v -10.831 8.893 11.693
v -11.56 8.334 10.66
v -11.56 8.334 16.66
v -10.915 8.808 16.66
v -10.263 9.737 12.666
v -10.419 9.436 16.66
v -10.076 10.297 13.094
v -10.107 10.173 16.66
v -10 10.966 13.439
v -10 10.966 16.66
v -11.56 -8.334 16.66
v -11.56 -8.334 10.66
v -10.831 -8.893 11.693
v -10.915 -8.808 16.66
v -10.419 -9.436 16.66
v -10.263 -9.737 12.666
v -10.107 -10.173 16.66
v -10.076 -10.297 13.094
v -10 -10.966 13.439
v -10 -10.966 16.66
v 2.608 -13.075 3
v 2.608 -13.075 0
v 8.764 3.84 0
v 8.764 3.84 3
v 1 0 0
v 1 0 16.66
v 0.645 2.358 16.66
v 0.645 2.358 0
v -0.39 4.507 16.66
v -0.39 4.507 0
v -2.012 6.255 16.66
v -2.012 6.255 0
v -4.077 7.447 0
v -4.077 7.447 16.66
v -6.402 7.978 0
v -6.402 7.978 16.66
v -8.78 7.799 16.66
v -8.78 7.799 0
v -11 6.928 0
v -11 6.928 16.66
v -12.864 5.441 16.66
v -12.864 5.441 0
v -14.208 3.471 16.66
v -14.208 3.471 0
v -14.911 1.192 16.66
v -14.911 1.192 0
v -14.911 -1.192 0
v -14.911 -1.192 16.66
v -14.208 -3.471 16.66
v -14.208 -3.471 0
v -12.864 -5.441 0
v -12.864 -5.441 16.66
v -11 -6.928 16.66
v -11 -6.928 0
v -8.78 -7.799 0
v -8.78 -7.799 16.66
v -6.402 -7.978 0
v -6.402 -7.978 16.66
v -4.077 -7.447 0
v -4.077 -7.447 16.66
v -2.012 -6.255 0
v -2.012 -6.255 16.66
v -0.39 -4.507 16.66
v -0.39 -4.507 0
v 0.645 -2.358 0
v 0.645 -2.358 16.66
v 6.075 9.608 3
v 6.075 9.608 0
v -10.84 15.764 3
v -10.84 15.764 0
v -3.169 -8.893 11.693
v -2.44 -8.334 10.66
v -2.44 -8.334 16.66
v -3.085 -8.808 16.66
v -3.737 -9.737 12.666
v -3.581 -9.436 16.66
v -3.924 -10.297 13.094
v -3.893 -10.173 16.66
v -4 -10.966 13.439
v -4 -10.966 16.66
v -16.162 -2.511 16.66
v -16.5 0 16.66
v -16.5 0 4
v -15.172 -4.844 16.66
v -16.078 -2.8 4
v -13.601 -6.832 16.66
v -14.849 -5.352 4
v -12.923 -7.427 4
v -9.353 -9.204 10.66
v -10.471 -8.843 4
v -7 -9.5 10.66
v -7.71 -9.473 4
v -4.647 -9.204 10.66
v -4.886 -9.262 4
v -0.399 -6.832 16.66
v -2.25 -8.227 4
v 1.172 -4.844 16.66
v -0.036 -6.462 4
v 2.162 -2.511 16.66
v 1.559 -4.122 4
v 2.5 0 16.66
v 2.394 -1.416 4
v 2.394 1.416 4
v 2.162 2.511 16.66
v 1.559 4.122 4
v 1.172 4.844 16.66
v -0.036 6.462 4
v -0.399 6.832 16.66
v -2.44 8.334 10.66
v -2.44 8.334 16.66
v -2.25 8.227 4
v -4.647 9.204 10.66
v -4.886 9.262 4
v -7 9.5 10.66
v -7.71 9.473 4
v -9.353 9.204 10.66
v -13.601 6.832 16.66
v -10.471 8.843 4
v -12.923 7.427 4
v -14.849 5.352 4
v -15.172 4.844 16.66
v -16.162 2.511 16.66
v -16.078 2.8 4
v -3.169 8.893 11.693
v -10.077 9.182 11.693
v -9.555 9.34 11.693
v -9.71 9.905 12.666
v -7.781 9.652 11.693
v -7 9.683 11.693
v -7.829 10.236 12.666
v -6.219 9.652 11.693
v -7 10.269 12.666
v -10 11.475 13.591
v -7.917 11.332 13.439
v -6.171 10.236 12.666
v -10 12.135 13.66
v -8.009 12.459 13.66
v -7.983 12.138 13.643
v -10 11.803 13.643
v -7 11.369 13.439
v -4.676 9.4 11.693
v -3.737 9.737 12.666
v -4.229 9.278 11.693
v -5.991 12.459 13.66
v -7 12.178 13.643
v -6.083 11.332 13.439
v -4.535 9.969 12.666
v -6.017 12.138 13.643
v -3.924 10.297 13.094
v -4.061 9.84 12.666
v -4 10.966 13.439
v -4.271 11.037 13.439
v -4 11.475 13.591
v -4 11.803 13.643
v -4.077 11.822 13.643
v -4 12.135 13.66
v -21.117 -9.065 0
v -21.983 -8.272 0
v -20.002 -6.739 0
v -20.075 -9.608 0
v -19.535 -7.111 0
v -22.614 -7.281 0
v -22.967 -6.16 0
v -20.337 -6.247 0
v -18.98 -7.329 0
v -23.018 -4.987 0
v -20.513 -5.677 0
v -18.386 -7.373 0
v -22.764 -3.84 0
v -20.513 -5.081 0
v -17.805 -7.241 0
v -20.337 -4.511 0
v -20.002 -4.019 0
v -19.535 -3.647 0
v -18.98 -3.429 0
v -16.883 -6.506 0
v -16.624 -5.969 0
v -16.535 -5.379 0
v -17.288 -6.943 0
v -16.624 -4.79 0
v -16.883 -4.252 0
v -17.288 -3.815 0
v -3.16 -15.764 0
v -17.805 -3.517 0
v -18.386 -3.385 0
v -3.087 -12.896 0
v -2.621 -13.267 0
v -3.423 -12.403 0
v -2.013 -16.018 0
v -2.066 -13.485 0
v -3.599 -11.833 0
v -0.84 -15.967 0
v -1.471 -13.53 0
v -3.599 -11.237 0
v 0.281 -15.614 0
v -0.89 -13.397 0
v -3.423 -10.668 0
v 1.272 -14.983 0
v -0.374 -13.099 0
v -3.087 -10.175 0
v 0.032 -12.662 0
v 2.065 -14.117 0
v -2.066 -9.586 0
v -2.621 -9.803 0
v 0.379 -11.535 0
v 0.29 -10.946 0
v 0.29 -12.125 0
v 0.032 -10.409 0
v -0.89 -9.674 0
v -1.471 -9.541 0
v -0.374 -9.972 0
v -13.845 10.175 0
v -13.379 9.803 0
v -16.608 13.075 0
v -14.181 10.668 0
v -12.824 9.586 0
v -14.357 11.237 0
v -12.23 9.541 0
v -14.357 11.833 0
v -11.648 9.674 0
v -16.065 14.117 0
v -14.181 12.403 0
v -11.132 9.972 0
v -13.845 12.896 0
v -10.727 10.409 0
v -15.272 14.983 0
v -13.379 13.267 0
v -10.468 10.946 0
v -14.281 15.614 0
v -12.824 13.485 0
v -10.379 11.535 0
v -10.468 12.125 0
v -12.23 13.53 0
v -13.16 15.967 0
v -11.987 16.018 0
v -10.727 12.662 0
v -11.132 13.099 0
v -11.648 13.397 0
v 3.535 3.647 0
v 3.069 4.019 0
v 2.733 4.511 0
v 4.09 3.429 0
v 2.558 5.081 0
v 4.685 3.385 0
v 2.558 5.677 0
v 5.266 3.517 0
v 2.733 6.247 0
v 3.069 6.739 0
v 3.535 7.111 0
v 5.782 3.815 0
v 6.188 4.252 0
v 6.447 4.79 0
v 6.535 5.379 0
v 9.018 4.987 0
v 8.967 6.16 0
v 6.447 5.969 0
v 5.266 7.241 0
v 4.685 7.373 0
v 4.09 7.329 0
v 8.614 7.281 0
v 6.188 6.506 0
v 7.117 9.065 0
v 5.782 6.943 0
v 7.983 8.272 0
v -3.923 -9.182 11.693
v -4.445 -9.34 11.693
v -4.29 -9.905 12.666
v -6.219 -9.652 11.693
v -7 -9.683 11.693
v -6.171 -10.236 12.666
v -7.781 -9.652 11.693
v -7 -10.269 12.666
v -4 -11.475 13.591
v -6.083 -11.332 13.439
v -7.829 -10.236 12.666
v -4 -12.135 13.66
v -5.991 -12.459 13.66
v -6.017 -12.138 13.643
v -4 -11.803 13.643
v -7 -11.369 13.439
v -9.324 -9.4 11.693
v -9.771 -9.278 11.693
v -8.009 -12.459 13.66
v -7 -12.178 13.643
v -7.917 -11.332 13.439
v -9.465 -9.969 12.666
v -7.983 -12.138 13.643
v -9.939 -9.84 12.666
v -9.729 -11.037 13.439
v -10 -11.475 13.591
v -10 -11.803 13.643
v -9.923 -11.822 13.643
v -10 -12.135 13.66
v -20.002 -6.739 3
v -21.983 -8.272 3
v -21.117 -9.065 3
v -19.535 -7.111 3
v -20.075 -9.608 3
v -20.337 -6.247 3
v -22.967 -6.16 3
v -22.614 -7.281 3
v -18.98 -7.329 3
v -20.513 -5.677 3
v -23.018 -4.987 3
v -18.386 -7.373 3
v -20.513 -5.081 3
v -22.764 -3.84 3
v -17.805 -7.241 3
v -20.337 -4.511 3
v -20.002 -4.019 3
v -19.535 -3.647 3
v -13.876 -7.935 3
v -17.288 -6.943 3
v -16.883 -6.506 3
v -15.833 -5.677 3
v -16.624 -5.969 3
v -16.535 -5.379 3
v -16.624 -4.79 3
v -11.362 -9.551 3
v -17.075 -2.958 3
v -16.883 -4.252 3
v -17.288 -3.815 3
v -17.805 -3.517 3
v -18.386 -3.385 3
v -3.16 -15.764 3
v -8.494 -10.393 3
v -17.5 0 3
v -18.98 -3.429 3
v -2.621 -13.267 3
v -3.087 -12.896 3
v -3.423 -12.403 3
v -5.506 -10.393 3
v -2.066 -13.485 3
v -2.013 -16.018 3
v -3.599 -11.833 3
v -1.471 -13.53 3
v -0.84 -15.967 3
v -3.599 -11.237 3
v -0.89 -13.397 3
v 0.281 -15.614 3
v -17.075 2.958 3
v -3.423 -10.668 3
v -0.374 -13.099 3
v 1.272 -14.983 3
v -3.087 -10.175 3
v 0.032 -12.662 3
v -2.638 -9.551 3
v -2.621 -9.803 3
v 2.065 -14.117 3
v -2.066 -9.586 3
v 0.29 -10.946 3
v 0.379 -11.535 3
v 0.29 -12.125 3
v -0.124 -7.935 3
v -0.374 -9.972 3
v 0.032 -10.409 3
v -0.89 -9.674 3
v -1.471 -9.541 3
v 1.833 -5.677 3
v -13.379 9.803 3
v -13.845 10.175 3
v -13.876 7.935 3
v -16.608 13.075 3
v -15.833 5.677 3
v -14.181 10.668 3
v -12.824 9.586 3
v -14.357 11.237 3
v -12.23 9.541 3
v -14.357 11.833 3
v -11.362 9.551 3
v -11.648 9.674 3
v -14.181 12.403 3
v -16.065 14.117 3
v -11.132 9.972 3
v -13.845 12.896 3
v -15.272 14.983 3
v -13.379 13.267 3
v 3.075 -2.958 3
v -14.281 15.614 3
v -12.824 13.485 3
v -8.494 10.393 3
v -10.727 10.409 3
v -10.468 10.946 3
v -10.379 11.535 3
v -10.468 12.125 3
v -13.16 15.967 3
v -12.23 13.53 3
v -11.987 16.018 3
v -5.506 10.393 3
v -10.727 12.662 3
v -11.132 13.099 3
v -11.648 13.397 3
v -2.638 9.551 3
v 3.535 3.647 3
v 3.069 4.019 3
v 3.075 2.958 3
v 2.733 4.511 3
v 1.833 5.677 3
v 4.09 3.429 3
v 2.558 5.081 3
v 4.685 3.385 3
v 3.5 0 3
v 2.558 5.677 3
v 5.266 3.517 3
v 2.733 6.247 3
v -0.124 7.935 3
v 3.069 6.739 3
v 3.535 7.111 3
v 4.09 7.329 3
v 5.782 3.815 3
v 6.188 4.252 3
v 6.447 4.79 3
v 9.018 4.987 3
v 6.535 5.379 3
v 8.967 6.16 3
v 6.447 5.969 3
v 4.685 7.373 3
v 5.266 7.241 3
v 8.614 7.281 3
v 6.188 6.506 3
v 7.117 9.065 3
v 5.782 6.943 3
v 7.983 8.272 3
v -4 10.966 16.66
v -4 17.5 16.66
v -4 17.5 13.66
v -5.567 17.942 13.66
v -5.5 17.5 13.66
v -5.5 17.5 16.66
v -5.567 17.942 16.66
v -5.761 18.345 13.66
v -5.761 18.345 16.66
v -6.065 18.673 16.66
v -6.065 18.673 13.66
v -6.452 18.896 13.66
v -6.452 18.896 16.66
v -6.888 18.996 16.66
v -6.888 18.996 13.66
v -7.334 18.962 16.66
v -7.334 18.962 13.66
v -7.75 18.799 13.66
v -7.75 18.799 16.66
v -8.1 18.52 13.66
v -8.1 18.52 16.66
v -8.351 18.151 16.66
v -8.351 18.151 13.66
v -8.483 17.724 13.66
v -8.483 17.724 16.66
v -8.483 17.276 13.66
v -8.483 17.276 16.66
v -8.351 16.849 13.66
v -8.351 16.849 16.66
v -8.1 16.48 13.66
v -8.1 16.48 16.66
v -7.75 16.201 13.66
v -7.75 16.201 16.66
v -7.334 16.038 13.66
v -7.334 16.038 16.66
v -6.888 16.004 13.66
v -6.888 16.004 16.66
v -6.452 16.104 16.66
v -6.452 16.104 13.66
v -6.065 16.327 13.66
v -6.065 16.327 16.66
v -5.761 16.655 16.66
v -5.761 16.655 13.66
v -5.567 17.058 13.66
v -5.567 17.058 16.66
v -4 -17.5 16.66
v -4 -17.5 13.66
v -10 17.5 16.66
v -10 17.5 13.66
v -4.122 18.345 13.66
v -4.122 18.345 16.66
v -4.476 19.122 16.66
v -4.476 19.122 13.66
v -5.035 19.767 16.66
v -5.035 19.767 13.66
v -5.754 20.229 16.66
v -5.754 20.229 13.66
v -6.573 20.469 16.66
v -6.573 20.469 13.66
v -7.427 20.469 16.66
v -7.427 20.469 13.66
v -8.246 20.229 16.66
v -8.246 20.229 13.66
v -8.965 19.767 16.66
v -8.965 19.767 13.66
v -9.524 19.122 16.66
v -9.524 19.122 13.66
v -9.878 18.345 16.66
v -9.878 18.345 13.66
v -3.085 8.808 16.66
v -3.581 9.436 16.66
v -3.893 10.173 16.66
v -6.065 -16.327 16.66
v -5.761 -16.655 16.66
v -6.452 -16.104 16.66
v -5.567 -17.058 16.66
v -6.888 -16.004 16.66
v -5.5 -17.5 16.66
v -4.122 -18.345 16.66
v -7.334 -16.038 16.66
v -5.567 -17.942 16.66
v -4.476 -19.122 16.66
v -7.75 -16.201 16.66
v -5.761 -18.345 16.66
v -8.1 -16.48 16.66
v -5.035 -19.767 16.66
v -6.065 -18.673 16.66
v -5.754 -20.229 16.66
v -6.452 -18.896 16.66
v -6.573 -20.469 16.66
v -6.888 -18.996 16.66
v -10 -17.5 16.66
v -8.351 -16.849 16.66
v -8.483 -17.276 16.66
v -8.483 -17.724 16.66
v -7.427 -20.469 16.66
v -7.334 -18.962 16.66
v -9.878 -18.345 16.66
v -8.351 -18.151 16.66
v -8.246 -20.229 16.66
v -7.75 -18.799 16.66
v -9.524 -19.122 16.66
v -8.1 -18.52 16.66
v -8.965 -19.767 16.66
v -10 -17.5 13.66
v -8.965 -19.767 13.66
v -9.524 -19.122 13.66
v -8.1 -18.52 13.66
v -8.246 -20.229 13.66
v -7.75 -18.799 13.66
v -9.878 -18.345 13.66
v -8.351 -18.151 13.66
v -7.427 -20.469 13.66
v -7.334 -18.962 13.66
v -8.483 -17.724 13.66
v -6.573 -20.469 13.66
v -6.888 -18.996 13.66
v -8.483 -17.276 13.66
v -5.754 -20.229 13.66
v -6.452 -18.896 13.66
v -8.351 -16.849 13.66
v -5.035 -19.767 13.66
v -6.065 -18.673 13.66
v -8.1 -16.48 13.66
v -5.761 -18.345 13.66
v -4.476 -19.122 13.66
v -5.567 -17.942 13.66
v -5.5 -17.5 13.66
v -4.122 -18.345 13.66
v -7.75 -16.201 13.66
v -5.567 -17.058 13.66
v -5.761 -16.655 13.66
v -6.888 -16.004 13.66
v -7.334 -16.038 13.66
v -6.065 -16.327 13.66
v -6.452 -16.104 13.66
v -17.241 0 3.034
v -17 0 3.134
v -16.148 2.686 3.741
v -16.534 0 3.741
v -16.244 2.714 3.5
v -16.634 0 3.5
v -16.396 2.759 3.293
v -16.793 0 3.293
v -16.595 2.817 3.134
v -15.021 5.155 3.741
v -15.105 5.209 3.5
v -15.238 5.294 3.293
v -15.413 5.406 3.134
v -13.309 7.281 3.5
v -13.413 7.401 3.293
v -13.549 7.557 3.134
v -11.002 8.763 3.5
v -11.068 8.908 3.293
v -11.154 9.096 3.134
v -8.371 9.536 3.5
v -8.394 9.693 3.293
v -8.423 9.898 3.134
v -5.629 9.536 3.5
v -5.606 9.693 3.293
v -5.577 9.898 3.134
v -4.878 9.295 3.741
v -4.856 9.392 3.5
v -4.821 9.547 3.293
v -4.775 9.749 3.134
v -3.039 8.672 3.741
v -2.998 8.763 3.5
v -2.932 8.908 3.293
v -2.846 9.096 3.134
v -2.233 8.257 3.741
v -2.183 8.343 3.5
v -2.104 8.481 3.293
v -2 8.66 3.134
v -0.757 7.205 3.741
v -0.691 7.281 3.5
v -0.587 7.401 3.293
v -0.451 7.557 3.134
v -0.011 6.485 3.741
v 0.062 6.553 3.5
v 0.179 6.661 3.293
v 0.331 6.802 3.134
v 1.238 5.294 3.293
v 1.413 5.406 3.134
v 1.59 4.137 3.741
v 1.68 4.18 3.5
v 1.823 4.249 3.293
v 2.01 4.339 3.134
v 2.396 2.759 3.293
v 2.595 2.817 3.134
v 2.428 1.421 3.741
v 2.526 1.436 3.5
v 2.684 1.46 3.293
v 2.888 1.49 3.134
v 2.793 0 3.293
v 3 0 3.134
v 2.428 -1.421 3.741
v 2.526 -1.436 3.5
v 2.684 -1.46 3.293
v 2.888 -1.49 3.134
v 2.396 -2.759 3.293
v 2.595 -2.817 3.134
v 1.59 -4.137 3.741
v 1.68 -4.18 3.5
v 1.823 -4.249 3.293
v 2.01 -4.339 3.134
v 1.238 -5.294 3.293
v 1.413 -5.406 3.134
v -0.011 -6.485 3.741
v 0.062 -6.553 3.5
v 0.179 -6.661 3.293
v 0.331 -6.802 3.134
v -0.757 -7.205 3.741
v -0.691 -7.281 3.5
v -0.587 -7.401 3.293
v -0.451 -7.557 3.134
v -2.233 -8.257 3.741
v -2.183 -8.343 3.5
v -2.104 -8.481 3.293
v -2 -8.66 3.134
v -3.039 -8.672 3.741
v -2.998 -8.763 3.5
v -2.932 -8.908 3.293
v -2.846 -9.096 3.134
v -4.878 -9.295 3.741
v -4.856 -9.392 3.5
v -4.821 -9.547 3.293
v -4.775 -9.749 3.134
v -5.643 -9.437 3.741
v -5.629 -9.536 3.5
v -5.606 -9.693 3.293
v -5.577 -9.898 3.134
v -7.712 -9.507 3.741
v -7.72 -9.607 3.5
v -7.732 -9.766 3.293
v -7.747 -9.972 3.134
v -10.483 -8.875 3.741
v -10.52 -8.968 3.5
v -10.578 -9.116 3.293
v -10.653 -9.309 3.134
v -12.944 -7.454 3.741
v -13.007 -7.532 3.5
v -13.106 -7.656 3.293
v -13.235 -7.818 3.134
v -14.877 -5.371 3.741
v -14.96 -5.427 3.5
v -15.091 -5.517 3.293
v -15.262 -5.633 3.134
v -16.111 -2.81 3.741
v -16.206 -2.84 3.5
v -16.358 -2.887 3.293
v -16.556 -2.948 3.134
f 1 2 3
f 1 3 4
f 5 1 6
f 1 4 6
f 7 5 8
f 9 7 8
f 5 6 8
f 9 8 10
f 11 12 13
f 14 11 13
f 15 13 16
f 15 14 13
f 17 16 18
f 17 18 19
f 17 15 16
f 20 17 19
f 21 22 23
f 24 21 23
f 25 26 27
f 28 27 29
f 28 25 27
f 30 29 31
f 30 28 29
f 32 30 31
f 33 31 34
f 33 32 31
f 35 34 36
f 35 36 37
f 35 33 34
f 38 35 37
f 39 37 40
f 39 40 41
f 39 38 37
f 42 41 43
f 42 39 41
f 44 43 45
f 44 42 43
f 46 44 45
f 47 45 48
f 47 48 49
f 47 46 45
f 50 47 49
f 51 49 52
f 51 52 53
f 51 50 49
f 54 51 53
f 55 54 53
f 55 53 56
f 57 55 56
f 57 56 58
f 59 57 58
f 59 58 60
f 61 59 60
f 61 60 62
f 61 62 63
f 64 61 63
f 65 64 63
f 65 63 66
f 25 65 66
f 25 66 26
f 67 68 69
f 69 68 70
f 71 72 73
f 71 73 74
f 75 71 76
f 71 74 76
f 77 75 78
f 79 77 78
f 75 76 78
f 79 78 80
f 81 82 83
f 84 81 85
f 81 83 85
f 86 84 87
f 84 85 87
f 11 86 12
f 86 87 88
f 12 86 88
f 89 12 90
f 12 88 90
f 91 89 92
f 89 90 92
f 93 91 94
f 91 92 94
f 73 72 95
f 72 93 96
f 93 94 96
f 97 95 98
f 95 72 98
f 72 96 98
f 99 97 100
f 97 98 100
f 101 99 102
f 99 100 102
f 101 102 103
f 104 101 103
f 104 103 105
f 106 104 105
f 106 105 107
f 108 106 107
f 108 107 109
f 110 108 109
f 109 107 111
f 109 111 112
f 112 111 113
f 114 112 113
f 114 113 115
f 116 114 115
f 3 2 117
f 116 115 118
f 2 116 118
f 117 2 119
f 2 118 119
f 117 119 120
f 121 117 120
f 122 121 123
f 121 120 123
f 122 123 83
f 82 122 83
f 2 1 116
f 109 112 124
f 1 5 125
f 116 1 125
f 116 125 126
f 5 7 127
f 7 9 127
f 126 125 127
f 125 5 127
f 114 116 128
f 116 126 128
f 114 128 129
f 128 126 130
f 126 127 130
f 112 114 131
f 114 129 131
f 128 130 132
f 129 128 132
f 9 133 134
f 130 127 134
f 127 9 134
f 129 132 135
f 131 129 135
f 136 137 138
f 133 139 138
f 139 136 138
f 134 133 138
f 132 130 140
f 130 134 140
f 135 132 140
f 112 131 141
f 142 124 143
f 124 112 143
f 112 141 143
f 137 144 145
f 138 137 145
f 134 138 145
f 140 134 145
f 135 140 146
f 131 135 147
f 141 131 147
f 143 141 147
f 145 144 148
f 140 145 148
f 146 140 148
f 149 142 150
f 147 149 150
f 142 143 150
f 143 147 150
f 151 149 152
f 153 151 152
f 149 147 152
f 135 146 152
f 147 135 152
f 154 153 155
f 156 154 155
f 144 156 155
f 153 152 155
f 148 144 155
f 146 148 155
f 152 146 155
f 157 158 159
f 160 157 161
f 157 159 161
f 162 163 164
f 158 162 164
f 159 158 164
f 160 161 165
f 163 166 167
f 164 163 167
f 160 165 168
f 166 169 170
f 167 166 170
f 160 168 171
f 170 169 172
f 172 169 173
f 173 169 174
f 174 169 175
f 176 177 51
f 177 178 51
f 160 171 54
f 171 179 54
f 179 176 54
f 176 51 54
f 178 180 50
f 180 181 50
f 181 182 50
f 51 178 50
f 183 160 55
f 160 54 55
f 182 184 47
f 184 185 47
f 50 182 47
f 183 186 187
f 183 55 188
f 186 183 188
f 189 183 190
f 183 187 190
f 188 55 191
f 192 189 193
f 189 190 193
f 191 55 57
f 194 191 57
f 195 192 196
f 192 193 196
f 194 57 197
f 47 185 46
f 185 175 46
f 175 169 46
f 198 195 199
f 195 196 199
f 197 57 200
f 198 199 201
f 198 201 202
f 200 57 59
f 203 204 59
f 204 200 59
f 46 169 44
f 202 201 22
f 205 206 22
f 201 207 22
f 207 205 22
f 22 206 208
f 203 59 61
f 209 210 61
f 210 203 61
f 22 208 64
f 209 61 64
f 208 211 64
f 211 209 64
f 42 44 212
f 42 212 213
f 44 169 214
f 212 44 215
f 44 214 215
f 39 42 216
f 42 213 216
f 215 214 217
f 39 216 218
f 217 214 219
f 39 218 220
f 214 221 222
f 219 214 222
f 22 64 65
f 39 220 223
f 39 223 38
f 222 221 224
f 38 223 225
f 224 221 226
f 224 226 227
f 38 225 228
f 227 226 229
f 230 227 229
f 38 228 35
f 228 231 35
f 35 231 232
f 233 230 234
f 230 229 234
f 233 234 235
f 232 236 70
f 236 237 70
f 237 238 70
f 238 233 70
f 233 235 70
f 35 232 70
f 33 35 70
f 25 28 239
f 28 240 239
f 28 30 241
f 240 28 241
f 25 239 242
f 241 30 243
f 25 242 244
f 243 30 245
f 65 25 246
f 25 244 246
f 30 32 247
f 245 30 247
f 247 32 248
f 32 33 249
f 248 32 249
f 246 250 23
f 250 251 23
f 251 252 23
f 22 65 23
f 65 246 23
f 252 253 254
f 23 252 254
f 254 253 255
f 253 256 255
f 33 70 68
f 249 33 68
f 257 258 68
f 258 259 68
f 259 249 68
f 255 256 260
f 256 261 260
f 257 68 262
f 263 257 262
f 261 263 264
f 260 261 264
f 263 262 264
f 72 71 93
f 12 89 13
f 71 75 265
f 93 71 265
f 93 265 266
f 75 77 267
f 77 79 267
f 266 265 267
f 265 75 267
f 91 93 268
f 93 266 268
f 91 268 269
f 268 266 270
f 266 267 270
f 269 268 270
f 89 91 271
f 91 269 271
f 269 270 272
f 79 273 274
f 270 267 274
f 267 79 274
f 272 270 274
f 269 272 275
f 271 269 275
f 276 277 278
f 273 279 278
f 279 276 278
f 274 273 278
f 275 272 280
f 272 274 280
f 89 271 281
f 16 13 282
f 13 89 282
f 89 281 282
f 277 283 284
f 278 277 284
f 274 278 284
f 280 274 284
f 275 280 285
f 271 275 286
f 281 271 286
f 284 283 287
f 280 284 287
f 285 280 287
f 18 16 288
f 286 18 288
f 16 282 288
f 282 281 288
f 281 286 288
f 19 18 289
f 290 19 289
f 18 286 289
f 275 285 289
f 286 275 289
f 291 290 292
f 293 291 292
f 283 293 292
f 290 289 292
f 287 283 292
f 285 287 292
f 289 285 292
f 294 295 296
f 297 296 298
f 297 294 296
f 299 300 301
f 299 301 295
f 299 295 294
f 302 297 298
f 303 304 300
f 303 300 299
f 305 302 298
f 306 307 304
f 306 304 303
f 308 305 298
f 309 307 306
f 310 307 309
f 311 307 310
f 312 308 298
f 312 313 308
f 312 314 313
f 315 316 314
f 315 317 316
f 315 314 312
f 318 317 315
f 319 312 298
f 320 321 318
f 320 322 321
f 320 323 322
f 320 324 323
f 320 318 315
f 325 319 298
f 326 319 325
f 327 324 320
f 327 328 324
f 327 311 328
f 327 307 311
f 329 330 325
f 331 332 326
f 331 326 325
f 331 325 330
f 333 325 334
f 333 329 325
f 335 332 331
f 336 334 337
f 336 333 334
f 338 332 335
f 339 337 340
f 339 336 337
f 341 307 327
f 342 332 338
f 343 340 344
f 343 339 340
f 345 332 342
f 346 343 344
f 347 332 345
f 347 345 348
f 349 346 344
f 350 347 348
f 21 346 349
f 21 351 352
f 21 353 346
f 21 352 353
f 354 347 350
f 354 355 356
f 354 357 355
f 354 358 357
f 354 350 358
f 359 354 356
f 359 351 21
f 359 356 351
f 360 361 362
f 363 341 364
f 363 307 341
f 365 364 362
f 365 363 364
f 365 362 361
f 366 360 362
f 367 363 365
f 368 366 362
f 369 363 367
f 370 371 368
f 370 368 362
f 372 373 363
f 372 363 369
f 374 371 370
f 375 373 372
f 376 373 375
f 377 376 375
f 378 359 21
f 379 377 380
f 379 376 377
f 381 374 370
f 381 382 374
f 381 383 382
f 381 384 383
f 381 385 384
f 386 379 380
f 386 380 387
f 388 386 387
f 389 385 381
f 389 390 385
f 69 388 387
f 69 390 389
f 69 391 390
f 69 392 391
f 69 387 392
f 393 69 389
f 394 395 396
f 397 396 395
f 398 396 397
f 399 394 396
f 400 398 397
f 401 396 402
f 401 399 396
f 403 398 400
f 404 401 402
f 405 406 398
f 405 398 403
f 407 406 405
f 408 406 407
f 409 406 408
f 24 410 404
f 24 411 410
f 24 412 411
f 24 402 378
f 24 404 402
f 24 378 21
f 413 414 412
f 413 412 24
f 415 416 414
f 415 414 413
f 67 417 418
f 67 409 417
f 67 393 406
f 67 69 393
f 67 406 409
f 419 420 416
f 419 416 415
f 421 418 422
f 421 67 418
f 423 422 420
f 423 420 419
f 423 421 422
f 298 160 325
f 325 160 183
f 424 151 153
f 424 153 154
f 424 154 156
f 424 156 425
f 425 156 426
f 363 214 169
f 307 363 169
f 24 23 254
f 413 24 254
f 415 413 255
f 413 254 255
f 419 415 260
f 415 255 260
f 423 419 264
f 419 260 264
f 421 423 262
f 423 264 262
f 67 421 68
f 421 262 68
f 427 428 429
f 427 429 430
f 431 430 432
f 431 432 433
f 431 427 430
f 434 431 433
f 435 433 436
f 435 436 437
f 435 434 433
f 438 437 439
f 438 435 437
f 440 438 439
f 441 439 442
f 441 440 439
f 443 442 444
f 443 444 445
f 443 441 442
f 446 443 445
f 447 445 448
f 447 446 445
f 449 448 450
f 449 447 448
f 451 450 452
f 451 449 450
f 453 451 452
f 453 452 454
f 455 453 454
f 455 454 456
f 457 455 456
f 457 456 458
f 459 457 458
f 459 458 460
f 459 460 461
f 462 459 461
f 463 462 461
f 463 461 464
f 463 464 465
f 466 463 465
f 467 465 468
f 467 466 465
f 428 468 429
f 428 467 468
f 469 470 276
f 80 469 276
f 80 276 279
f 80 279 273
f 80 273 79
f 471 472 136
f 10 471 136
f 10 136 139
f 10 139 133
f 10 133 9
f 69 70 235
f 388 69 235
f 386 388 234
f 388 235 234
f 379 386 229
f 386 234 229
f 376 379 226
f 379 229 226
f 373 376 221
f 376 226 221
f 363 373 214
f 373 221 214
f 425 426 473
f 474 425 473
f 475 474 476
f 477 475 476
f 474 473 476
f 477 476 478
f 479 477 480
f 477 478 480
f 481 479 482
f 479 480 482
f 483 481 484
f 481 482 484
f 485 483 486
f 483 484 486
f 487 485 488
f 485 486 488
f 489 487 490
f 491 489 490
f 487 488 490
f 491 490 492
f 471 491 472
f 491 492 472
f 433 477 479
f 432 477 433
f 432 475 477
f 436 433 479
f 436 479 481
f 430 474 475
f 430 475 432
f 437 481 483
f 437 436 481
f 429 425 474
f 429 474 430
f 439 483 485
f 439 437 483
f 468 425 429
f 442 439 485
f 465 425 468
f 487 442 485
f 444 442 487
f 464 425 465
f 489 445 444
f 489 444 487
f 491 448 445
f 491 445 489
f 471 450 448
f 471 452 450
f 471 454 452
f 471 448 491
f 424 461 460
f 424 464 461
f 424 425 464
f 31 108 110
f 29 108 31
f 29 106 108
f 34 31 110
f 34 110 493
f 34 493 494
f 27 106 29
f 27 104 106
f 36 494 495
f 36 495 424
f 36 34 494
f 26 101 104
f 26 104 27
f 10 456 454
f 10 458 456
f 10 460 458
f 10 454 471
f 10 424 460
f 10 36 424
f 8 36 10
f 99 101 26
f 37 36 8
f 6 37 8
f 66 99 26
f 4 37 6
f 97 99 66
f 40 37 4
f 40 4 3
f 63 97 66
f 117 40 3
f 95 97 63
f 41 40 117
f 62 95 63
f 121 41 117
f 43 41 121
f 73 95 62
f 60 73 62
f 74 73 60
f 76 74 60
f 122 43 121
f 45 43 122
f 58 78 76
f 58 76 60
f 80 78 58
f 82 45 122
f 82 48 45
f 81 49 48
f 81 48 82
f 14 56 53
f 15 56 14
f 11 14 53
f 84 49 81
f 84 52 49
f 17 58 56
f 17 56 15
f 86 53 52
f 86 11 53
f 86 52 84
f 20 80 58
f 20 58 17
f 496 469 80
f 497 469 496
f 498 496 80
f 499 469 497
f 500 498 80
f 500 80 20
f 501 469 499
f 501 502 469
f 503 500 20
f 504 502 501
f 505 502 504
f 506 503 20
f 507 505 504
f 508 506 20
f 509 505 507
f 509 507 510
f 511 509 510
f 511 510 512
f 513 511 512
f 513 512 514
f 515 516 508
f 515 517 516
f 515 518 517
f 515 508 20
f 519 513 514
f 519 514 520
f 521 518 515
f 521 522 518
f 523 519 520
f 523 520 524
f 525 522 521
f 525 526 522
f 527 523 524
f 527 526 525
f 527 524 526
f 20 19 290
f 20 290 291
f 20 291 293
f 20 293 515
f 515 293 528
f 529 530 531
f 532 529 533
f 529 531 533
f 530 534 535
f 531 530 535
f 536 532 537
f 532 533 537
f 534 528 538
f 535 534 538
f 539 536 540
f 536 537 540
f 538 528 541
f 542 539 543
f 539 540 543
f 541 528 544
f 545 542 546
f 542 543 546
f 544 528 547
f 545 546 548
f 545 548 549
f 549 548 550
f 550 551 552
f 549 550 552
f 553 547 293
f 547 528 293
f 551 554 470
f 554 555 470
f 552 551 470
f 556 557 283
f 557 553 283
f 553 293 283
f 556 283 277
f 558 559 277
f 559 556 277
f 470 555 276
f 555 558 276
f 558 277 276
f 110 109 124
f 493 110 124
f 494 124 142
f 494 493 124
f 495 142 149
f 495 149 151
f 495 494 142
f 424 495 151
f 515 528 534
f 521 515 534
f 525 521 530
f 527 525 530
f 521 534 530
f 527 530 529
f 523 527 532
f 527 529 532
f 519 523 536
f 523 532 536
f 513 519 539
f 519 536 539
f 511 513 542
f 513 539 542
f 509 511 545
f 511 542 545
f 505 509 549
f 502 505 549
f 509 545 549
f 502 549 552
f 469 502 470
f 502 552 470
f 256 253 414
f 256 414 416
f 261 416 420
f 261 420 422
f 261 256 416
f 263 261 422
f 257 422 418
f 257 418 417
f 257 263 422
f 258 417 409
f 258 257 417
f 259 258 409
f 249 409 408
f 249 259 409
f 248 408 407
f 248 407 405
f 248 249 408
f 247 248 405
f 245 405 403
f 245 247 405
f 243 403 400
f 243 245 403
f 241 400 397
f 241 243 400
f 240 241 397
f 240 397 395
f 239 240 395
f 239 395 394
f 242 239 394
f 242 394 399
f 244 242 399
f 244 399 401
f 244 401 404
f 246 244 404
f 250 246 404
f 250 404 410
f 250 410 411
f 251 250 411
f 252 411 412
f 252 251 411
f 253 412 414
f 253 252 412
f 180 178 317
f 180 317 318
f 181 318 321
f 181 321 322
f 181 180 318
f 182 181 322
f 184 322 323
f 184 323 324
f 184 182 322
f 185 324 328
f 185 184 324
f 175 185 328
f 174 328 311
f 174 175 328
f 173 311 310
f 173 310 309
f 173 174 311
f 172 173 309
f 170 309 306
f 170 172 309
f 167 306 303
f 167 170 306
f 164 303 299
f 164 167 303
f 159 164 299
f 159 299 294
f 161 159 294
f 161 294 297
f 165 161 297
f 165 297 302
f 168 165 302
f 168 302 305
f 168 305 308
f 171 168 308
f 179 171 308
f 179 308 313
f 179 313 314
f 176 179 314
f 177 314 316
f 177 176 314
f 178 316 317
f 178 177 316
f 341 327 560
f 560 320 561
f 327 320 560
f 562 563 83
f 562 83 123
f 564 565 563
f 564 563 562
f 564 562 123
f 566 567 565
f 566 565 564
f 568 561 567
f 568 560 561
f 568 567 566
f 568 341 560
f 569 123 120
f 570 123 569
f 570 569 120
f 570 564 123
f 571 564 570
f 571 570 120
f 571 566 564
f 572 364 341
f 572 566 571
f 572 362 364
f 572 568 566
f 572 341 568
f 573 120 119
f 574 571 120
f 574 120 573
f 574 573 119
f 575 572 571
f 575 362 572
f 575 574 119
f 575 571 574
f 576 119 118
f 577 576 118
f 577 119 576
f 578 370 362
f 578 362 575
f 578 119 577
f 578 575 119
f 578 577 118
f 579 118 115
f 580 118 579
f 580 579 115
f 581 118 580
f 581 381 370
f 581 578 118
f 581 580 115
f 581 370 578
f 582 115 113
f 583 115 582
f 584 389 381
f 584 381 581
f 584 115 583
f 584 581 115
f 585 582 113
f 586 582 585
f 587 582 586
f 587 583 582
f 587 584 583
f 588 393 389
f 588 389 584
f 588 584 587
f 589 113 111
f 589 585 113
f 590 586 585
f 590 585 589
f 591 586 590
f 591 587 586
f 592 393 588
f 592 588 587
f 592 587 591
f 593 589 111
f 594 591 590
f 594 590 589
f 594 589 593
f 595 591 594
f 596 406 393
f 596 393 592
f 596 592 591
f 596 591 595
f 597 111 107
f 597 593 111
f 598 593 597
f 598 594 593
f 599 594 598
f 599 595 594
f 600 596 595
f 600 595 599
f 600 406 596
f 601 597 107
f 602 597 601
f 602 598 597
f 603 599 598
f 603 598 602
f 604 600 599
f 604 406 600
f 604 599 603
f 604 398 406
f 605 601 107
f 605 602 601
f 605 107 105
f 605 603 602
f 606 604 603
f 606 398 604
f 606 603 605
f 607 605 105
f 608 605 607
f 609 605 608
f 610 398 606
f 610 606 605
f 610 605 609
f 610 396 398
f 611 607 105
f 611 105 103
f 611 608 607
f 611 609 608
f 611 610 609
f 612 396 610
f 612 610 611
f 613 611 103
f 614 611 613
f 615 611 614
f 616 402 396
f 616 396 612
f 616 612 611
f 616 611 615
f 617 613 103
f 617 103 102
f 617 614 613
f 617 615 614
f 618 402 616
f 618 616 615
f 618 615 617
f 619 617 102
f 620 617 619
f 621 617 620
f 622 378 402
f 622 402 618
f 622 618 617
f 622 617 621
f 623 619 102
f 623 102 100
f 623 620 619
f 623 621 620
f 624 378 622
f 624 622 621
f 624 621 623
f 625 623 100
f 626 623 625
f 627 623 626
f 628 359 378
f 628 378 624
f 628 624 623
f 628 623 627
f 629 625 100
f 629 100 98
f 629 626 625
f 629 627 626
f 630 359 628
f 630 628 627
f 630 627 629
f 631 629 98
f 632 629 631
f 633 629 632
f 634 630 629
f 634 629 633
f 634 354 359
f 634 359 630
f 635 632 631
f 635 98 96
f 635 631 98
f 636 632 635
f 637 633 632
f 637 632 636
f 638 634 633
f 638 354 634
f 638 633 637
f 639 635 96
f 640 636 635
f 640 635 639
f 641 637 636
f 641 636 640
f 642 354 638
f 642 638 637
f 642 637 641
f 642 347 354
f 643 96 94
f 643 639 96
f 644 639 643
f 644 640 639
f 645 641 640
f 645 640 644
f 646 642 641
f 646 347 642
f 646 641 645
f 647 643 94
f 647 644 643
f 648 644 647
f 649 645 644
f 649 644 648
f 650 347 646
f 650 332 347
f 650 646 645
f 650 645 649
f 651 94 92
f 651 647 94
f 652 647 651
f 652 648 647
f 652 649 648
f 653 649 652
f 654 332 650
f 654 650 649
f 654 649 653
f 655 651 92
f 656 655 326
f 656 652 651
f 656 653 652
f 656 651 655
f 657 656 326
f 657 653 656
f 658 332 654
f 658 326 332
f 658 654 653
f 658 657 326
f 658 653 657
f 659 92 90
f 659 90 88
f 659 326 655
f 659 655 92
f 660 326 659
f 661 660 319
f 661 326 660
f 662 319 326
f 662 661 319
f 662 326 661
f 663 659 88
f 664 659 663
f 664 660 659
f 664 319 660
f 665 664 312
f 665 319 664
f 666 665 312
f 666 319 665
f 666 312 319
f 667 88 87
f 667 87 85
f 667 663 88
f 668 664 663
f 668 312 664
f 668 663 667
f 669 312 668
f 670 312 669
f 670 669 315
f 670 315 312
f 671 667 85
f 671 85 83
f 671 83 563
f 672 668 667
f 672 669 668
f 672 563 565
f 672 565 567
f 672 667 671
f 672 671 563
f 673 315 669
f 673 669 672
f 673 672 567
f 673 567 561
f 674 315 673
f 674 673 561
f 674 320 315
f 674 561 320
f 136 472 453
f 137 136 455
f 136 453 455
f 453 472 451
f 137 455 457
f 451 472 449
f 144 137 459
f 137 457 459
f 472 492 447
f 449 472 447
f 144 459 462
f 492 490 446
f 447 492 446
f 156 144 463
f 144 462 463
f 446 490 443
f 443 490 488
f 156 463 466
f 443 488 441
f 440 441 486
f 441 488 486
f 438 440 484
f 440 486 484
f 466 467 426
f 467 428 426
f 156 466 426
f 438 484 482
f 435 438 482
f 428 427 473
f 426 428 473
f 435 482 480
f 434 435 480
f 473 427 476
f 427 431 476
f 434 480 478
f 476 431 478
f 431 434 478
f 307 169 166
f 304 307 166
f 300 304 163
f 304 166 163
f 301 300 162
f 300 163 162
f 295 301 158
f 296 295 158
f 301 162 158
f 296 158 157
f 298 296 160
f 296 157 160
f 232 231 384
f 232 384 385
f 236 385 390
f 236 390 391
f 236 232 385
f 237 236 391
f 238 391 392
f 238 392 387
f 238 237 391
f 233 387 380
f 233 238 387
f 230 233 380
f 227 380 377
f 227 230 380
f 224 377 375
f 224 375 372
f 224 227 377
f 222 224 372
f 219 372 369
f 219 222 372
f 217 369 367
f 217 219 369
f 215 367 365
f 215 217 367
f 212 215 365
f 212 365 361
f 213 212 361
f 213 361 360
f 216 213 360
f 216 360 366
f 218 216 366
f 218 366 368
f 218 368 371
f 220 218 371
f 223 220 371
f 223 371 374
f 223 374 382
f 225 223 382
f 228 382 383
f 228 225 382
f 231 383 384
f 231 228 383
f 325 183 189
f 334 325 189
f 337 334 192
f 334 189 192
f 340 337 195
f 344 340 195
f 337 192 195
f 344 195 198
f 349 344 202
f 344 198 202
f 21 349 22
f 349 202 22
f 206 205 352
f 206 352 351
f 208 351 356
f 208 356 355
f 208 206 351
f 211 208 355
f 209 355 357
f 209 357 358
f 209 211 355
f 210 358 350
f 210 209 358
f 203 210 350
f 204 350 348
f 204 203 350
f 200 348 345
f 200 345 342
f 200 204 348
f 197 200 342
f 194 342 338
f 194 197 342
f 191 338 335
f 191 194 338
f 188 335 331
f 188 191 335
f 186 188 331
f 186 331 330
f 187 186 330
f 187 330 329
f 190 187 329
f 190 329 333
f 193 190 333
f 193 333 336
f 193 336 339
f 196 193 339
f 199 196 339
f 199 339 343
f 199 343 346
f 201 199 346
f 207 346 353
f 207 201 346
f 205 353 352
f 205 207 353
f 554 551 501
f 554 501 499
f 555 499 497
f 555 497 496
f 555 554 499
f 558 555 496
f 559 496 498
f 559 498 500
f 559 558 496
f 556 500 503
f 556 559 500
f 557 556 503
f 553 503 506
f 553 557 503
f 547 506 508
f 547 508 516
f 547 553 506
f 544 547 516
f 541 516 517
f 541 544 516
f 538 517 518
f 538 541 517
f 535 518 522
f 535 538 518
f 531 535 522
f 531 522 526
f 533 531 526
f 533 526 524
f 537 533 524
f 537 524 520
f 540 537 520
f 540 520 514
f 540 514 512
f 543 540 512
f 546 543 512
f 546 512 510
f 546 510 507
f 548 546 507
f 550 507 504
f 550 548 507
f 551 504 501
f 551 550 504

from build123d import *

# Parameters (mm, degrees)
SKETCH1_R           = 8
SKETCH1_R_2         = 2
BOSS_EXTRUDE1_DEPTH = 3
SKETCH2_R           = 9.5
SKETCH2_R_2         = 8
BOSS_EXTRUDE2_DEPTH = 16.66
BOSS_EXTRUDE3_START = -3
SKETCH3_R           = 1.5
BOSS_EXTRUDE3_DEPTH = 3
FILLET1_R           = 3
FILLET2_R           = 1


with BuildPart() as part:
    # Sketch1 → Boss-Extrude1 (new body)
    with BuildSketch(Plane.XY):
        with BuildLine():
            Line((-20.074505522, -9.607669091), (-3.160038348, -15.764031671))
            ThreePointArc((-3.160038348, -15.764031671), (0.280834475, -15.613799919), (2.607669091, -13.074505522))
            Line((2.607669091, -13.074505522), (8.764031671, 3.839961652))
            ThreePointArc((8.764031671, 3.839961652), (8.613799919, 7.280834475), (6.074505522, 9.607669091))
            Line((6.074505522, 9.607669091), (-10.839961652, 15.764031671))
            ThreePointArc((-10.839961652, 15.764031671), (-14.280834475, 15.613799919), (-16.607669091, 13.074505522))
            Line((-16.607669091, 13.074505522), (-22.764031671, -3.839961652))
            ThreePointArc((-22.764031671, -3.839961652), (-22.613799919, -7.280834475), (-20.074505522, -9.607669091))
        make_face()
        with Locations((-7, 0)):
            Circle(SKETCH1_R, mode=Mode.SUBTRACT)
        with Locations((-12.379052297, 11.535414877)):
            Circle(SKETCH1_R_2, mode=Mode.SUBTRACT)
        with Locations((4.535414877, 5.379052297)):
            Circle(SKETCH1_R_2, mode=Mode.SUBTRACT)
        with Locations((-1.620947703, -11.535414877)):
            Circle(SKETCH1_R_2, mode=Mode.SUBTRACT)
        with Locations((-18.535414877, -5.379052297)):
            Circle(SKETCH1_R_2, mode=Mode.SUBTRACT)
    extrude(amount=BOSS_EXTRUDE1_DEPTH)

    # Sketch2 → Boss-Extrude2 (add)
    with BuildSketch(Plane.XY):
        with Locations(Location((-7, 0, 0), (0, 0, 180))):
            Circle(SKETCH2_R)
        with Locations((-7, 0)):
            Circle(SKETCH2_R_2, mode=Mode.SUBTRACT)
    extrude(amount=BOSS_EXTRUDE2_DEPTH)

    # Sketch3 → Boss-Extrude3 (add)
    # profile 1 of 2: a face of its own
    with BuildSketch(Plane.XY.offset(16.66).offset(BOSS_EXTRUDE3_START)):
        with BuildLine():
            Line((-4, 9.013878189), (-4, 17.5))
            ThreePointArc((-4, 17.5), (-7, 20.5), (-10, 17.5))
            Line((-10, 17.5), (-10, 9.013878189))
            ThreePointArc((-10, 9.013878189), (-7, 9.5), (-4, 9.013878189))
        make_face()
        with Locations((-7, 17.5)):
            Circle(SKETCH3_R, mode=Mode.SUBTRACT)
    # profile 2 of 2: a face of its own
    with BuildSketch(Plane.XY.offset(16.66).offset(BOSS_EXTRUDE3_START)):
        with BuildLine():
            Line((-10, -9.013878189), (-10, -17.5))
            ThreePointArc((-10, -17.5), (-7, -20.5), (-4, -17.5))
            Line((-4, -17.5), (-4, -9.013878189))
            ThreePointArc((-4, -9.013878189), (-7, -9.5), (-10, -9.013878189))
        make_face()
        with Locations((-7, -17.5)):
            Circle(SKETCH3_R, mode=Mode.SUBTRACT)
    extrude(amount=BOSS_EXTRUDE3_DEPTH)

    # Fillet1
    fillet1_edges = [part.edges().sort_by_distance(p)[0] for p in [
        (-10, -9.013878189, 15.16),
        (-4, -9.013878189, 15.16),
        (-7, -9.5, 13.66),
        (-4, 9.013878189, 15.16),
        (-10, 9.013878189, 15.16),
        (-7, 9.5, 13.66),
    ]]
    fillet(fillet1_edges, radius=FILLET1_R)

    # Fillet2
    fillet2_edges = [part.edges().sort_by_distance(p)[0] for p in [
        (2.5, 0, 3),
    ]]
    fillet(fillet2_edges, radius=FILLET2_R)


solid = part.part
